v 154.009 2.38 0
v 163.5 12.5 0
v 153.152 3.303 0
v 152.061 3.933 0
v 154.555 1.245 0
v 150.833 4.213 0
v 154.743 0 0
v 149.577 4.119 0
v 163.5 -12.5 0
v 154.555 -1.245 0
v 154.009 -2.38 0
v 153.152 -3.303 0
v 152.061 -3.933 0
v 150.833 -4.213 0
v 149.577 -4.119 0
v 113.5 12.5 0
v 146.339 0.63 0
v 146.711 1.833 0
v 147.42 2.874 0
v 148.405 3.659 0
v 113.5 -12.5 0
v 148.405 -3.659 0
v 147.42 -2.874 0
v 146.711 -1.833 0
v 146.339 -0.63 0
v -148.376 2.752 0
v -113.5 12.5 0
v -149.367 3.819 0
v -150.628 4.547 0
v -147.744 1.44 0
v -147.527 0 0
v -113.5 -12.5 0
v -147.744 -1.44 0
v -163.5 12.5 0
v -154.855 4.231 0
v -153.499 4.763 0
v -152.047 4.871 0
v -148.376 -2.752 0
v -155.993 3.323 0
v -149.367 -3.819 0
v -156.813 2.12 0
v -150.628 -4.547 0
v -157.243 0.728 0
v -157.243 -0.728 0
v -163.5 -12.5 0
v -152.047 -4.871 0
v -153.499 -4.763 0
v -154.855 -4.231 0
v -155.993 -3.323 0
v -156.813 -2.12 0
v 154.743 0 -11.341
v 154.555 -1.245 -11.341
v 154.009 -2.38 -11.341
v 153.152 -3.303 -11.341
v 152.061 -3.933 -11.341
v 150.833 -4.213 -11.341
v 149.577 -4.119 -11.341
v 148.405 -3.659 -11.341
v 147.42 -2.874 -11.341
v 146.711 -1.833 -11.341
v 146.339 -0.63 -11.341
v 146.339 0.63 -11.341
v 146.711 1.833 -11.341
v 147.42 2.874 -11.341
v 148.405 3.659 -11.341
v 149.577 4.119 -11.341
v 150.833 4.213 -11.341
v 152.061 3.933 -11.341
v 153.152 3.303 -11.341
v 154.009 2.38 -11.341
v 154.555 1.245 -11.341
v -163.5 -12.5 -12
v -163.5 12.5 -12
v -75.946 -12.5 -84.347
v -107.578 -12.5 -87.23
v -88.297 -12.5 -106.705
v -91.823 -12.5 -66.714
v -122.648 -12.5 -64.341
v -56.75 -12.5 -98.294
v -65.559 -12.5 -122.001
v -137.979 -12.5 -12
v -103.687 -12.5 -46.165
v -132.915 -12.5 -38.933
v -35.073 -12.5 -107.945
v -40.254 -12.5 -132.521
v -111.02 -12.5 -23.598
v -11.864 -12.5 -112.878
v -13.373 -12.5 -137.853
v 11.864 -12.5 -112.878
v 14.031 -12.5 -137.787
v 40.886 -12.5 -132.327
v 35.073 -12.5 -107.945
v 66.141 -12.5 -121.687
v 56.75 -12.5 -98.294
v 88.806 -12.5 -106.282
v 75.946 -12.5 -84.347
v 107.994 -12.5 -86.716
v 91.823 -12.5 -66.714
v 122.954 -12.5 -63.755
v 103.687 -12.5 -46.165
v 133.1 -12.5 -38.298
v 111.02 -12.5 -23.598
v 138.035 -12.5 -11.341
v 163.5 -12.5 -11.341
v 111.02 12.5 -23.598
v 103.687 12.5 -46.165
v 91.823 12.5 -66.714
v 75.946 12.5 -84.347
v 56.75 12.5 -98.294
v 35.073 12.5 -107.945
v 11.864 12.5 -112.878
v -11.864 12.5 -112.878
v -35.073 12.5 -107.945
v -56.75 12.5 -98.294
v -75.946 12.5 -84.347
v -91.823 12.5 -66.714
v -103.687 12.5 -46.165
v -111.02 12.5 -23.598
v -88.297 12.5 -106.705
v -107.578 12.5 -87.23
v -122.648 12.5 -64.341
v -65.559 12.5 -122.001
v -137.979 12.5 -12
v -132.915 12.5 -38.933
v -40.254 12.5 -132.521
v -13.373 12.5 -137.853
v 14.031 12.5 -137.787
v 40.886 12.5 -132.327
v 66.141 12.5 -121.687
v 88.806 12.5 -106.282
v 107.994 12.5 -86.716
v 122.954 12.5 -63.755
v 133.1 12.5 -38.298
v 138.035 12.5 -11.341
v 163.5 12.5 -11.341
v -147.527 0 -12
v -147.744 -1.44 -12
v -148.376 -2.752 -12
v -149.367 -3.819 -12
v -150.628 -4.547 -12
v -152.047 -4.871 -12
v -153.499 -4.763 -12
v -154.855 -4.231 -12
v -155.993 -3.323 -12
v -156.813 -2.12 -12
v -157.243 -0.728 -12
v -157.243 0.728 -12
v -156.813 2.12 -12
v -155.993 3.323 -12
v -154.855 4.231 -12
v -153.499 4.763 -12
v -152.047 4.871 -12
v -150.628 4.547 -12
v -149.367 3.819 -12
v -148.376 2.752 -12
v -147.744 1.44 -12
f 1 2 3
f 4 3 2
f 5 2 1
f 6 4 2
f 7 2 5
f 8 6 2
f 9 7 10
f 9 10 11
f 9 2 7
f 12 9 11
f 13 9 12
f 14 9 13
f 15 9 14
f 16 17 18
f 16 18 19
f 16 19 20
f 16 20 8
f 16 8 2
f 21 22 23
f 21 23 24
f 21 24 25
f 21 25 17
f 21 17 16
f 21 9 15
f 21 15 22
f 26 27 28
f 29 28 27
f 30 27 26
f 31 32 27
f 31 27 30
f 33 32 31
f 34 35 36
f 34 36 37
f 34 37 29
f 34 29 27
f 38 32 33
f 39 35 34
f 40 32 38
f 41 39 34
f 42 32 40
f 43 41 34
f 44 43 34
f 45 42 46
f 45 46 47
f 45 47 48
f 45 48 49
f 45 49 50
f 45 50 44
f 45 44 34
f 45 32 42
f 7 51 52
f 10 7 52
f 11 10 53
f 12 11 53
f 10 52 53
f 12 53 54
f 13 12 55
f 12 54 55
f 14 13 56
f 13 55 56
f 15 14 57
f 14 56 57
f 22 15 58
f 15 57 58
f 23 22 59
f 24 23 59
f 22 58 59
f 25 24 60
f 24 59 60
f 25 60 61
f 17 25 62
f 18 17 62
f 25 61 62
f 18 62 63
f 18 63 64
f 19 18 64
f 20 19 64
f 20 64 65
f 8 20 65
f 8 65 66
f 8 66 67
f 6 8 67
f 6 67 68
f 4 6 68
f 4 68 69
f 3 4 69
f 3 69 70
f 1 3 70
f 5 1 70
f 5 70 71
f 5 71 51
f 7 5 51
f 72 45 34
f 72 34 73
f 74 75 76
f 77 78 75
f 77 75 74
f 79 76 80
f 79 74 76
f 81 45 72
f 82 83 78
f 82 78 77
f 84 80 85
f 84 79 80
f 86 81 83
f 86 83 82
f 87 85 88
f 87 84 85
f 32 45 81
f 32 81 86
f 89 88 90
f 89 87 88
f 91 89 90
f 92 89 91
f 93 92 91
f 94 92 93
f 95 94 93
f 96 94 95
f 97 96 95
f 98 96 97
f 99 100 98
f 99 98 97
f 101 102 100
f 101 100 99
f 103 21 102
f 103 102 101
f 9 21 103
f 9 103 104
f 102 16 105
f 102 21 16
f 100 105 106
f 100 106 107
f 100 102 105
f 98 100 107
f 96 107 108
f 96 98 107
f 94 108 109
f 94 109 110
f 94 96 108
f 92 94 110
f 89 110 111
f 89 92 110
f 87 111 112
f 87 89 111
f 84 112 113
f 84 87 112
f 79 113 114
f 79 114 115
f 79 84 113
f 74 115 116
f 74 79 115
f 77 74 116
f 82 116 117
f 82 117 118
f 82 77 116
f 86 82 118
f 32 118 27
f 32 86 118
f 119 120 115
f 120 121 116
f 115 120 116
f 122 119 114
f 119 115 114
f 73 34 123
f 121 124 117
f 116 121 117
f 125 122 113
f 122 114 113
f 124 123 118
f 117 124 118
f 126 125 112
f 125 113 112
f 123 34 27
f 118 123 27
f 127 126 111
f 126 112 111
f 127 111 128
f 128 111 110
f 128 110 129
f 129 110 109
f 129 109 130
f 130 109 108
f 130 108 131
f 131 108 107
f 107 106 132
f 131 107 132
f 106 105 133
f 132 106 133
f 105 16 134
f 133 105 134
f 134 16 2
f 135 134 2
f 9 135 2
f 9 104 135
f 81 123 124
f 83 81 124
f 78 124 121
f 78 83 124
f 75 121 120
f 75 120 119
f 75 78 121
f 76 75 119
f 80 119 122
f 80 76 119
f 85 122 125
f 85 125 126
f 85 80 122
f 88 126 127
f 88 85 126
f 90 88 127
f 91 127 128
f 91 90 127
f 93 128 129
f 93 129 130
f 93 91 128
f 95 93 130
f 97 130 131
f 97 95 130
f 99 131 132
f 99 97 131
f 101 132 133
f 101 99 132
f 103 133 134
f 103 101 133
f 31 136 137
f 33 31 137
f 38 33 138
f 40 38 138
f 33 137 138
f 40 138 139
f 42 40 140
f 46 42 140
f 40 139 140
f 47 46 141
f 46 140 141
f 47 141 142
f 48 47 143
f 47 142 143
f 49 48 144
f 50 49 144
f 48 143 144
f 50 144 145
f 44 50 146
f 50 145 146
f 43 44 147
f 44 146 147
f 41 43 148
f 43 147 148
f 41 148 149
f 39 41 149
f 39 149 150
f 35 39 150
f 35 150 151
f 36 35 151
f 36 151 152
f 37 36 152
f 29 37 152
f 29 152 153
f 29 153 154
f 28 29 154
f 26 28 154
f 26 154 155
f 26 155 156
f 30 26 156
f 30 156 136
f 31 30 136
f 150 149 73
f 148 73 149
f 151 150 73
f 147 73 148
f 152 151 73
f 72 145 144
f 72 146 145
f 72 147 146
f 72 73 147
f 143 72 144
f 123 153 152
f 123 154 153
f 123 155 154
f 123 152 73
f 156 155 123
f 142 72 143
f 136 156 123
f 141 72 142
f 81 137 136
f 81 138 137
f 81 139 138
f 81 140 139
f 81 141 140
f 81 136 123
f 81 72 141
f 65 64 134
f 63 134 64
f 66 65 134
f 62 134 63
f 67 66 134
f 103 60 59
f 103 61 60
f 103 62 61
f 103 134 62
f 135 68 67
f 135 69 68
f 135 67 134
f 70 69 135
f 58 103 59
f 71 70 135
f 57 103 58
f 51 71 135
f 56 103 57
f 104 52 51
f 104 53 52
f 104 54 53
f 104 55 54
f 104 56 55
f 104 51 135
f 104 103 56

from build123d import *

# Parameters (mm, degrees)
F1_DEPTH = 12.5
F2_R     = 4.225259
F3_DEPTH = 11.342264
F4_R     = 4.884984
F5_DEPTH = 25


with BuildPart() as f1:
    # F0 (on Front) → F1 (new body, symmetric)
    with BuildSketch(Plane.XZ):
        with BuildLine():
            ThreePointArc((113.5, 0), (0, -113.5), (-113.5, 0))
            Line((-113.5, 0), (-138.5, 0))
            Line((-138.5, 0), (-163.5, 0))
            Line((-163.5, 0), (-163.5, -12))
            Line((-163.5, -12), (-137.979165, -12))
            ThreePointArc((-137.979165, -12), (0.330544, -138.499606), (138.034871, -11.341264))
            Line((138.034871, -11.341264), (163.5, -11.341264))
            Line((163.5, -11.341264), (163.5, 0))
            Line((163.5, 0), (138.5, 0))
            Line((138.5, 0), (113.5, 0))
        make_face()
    extrude(amount=F1_DEPTH, both=True)

    # F2 (on face) → F3 (cut, through all)
    with BuildSketch(Plane(origin=(0, 0, -11.341264), x_dir=(1, 0, 0), z_dir=(0, 0, -1))):
        with Locations((150.517523, 0)):
            Circle(F2_R)
    extrude(amount=-F3_DEPTH, mode=Mode.SUBTRACT)

    # F4 (on face) → F5 (cut)
    with BuildSketch(Plane(origin=(0, 0, -12), x_dir=(1, 0, 0), z_dir=(0, 0, -1))):
        with Locations((-152.41228, 0)):
            Circle(F4_R)
    extrude(amount=-F5_DEPTH, mode=Mode.SUBTRACT)


solid = f1.part
